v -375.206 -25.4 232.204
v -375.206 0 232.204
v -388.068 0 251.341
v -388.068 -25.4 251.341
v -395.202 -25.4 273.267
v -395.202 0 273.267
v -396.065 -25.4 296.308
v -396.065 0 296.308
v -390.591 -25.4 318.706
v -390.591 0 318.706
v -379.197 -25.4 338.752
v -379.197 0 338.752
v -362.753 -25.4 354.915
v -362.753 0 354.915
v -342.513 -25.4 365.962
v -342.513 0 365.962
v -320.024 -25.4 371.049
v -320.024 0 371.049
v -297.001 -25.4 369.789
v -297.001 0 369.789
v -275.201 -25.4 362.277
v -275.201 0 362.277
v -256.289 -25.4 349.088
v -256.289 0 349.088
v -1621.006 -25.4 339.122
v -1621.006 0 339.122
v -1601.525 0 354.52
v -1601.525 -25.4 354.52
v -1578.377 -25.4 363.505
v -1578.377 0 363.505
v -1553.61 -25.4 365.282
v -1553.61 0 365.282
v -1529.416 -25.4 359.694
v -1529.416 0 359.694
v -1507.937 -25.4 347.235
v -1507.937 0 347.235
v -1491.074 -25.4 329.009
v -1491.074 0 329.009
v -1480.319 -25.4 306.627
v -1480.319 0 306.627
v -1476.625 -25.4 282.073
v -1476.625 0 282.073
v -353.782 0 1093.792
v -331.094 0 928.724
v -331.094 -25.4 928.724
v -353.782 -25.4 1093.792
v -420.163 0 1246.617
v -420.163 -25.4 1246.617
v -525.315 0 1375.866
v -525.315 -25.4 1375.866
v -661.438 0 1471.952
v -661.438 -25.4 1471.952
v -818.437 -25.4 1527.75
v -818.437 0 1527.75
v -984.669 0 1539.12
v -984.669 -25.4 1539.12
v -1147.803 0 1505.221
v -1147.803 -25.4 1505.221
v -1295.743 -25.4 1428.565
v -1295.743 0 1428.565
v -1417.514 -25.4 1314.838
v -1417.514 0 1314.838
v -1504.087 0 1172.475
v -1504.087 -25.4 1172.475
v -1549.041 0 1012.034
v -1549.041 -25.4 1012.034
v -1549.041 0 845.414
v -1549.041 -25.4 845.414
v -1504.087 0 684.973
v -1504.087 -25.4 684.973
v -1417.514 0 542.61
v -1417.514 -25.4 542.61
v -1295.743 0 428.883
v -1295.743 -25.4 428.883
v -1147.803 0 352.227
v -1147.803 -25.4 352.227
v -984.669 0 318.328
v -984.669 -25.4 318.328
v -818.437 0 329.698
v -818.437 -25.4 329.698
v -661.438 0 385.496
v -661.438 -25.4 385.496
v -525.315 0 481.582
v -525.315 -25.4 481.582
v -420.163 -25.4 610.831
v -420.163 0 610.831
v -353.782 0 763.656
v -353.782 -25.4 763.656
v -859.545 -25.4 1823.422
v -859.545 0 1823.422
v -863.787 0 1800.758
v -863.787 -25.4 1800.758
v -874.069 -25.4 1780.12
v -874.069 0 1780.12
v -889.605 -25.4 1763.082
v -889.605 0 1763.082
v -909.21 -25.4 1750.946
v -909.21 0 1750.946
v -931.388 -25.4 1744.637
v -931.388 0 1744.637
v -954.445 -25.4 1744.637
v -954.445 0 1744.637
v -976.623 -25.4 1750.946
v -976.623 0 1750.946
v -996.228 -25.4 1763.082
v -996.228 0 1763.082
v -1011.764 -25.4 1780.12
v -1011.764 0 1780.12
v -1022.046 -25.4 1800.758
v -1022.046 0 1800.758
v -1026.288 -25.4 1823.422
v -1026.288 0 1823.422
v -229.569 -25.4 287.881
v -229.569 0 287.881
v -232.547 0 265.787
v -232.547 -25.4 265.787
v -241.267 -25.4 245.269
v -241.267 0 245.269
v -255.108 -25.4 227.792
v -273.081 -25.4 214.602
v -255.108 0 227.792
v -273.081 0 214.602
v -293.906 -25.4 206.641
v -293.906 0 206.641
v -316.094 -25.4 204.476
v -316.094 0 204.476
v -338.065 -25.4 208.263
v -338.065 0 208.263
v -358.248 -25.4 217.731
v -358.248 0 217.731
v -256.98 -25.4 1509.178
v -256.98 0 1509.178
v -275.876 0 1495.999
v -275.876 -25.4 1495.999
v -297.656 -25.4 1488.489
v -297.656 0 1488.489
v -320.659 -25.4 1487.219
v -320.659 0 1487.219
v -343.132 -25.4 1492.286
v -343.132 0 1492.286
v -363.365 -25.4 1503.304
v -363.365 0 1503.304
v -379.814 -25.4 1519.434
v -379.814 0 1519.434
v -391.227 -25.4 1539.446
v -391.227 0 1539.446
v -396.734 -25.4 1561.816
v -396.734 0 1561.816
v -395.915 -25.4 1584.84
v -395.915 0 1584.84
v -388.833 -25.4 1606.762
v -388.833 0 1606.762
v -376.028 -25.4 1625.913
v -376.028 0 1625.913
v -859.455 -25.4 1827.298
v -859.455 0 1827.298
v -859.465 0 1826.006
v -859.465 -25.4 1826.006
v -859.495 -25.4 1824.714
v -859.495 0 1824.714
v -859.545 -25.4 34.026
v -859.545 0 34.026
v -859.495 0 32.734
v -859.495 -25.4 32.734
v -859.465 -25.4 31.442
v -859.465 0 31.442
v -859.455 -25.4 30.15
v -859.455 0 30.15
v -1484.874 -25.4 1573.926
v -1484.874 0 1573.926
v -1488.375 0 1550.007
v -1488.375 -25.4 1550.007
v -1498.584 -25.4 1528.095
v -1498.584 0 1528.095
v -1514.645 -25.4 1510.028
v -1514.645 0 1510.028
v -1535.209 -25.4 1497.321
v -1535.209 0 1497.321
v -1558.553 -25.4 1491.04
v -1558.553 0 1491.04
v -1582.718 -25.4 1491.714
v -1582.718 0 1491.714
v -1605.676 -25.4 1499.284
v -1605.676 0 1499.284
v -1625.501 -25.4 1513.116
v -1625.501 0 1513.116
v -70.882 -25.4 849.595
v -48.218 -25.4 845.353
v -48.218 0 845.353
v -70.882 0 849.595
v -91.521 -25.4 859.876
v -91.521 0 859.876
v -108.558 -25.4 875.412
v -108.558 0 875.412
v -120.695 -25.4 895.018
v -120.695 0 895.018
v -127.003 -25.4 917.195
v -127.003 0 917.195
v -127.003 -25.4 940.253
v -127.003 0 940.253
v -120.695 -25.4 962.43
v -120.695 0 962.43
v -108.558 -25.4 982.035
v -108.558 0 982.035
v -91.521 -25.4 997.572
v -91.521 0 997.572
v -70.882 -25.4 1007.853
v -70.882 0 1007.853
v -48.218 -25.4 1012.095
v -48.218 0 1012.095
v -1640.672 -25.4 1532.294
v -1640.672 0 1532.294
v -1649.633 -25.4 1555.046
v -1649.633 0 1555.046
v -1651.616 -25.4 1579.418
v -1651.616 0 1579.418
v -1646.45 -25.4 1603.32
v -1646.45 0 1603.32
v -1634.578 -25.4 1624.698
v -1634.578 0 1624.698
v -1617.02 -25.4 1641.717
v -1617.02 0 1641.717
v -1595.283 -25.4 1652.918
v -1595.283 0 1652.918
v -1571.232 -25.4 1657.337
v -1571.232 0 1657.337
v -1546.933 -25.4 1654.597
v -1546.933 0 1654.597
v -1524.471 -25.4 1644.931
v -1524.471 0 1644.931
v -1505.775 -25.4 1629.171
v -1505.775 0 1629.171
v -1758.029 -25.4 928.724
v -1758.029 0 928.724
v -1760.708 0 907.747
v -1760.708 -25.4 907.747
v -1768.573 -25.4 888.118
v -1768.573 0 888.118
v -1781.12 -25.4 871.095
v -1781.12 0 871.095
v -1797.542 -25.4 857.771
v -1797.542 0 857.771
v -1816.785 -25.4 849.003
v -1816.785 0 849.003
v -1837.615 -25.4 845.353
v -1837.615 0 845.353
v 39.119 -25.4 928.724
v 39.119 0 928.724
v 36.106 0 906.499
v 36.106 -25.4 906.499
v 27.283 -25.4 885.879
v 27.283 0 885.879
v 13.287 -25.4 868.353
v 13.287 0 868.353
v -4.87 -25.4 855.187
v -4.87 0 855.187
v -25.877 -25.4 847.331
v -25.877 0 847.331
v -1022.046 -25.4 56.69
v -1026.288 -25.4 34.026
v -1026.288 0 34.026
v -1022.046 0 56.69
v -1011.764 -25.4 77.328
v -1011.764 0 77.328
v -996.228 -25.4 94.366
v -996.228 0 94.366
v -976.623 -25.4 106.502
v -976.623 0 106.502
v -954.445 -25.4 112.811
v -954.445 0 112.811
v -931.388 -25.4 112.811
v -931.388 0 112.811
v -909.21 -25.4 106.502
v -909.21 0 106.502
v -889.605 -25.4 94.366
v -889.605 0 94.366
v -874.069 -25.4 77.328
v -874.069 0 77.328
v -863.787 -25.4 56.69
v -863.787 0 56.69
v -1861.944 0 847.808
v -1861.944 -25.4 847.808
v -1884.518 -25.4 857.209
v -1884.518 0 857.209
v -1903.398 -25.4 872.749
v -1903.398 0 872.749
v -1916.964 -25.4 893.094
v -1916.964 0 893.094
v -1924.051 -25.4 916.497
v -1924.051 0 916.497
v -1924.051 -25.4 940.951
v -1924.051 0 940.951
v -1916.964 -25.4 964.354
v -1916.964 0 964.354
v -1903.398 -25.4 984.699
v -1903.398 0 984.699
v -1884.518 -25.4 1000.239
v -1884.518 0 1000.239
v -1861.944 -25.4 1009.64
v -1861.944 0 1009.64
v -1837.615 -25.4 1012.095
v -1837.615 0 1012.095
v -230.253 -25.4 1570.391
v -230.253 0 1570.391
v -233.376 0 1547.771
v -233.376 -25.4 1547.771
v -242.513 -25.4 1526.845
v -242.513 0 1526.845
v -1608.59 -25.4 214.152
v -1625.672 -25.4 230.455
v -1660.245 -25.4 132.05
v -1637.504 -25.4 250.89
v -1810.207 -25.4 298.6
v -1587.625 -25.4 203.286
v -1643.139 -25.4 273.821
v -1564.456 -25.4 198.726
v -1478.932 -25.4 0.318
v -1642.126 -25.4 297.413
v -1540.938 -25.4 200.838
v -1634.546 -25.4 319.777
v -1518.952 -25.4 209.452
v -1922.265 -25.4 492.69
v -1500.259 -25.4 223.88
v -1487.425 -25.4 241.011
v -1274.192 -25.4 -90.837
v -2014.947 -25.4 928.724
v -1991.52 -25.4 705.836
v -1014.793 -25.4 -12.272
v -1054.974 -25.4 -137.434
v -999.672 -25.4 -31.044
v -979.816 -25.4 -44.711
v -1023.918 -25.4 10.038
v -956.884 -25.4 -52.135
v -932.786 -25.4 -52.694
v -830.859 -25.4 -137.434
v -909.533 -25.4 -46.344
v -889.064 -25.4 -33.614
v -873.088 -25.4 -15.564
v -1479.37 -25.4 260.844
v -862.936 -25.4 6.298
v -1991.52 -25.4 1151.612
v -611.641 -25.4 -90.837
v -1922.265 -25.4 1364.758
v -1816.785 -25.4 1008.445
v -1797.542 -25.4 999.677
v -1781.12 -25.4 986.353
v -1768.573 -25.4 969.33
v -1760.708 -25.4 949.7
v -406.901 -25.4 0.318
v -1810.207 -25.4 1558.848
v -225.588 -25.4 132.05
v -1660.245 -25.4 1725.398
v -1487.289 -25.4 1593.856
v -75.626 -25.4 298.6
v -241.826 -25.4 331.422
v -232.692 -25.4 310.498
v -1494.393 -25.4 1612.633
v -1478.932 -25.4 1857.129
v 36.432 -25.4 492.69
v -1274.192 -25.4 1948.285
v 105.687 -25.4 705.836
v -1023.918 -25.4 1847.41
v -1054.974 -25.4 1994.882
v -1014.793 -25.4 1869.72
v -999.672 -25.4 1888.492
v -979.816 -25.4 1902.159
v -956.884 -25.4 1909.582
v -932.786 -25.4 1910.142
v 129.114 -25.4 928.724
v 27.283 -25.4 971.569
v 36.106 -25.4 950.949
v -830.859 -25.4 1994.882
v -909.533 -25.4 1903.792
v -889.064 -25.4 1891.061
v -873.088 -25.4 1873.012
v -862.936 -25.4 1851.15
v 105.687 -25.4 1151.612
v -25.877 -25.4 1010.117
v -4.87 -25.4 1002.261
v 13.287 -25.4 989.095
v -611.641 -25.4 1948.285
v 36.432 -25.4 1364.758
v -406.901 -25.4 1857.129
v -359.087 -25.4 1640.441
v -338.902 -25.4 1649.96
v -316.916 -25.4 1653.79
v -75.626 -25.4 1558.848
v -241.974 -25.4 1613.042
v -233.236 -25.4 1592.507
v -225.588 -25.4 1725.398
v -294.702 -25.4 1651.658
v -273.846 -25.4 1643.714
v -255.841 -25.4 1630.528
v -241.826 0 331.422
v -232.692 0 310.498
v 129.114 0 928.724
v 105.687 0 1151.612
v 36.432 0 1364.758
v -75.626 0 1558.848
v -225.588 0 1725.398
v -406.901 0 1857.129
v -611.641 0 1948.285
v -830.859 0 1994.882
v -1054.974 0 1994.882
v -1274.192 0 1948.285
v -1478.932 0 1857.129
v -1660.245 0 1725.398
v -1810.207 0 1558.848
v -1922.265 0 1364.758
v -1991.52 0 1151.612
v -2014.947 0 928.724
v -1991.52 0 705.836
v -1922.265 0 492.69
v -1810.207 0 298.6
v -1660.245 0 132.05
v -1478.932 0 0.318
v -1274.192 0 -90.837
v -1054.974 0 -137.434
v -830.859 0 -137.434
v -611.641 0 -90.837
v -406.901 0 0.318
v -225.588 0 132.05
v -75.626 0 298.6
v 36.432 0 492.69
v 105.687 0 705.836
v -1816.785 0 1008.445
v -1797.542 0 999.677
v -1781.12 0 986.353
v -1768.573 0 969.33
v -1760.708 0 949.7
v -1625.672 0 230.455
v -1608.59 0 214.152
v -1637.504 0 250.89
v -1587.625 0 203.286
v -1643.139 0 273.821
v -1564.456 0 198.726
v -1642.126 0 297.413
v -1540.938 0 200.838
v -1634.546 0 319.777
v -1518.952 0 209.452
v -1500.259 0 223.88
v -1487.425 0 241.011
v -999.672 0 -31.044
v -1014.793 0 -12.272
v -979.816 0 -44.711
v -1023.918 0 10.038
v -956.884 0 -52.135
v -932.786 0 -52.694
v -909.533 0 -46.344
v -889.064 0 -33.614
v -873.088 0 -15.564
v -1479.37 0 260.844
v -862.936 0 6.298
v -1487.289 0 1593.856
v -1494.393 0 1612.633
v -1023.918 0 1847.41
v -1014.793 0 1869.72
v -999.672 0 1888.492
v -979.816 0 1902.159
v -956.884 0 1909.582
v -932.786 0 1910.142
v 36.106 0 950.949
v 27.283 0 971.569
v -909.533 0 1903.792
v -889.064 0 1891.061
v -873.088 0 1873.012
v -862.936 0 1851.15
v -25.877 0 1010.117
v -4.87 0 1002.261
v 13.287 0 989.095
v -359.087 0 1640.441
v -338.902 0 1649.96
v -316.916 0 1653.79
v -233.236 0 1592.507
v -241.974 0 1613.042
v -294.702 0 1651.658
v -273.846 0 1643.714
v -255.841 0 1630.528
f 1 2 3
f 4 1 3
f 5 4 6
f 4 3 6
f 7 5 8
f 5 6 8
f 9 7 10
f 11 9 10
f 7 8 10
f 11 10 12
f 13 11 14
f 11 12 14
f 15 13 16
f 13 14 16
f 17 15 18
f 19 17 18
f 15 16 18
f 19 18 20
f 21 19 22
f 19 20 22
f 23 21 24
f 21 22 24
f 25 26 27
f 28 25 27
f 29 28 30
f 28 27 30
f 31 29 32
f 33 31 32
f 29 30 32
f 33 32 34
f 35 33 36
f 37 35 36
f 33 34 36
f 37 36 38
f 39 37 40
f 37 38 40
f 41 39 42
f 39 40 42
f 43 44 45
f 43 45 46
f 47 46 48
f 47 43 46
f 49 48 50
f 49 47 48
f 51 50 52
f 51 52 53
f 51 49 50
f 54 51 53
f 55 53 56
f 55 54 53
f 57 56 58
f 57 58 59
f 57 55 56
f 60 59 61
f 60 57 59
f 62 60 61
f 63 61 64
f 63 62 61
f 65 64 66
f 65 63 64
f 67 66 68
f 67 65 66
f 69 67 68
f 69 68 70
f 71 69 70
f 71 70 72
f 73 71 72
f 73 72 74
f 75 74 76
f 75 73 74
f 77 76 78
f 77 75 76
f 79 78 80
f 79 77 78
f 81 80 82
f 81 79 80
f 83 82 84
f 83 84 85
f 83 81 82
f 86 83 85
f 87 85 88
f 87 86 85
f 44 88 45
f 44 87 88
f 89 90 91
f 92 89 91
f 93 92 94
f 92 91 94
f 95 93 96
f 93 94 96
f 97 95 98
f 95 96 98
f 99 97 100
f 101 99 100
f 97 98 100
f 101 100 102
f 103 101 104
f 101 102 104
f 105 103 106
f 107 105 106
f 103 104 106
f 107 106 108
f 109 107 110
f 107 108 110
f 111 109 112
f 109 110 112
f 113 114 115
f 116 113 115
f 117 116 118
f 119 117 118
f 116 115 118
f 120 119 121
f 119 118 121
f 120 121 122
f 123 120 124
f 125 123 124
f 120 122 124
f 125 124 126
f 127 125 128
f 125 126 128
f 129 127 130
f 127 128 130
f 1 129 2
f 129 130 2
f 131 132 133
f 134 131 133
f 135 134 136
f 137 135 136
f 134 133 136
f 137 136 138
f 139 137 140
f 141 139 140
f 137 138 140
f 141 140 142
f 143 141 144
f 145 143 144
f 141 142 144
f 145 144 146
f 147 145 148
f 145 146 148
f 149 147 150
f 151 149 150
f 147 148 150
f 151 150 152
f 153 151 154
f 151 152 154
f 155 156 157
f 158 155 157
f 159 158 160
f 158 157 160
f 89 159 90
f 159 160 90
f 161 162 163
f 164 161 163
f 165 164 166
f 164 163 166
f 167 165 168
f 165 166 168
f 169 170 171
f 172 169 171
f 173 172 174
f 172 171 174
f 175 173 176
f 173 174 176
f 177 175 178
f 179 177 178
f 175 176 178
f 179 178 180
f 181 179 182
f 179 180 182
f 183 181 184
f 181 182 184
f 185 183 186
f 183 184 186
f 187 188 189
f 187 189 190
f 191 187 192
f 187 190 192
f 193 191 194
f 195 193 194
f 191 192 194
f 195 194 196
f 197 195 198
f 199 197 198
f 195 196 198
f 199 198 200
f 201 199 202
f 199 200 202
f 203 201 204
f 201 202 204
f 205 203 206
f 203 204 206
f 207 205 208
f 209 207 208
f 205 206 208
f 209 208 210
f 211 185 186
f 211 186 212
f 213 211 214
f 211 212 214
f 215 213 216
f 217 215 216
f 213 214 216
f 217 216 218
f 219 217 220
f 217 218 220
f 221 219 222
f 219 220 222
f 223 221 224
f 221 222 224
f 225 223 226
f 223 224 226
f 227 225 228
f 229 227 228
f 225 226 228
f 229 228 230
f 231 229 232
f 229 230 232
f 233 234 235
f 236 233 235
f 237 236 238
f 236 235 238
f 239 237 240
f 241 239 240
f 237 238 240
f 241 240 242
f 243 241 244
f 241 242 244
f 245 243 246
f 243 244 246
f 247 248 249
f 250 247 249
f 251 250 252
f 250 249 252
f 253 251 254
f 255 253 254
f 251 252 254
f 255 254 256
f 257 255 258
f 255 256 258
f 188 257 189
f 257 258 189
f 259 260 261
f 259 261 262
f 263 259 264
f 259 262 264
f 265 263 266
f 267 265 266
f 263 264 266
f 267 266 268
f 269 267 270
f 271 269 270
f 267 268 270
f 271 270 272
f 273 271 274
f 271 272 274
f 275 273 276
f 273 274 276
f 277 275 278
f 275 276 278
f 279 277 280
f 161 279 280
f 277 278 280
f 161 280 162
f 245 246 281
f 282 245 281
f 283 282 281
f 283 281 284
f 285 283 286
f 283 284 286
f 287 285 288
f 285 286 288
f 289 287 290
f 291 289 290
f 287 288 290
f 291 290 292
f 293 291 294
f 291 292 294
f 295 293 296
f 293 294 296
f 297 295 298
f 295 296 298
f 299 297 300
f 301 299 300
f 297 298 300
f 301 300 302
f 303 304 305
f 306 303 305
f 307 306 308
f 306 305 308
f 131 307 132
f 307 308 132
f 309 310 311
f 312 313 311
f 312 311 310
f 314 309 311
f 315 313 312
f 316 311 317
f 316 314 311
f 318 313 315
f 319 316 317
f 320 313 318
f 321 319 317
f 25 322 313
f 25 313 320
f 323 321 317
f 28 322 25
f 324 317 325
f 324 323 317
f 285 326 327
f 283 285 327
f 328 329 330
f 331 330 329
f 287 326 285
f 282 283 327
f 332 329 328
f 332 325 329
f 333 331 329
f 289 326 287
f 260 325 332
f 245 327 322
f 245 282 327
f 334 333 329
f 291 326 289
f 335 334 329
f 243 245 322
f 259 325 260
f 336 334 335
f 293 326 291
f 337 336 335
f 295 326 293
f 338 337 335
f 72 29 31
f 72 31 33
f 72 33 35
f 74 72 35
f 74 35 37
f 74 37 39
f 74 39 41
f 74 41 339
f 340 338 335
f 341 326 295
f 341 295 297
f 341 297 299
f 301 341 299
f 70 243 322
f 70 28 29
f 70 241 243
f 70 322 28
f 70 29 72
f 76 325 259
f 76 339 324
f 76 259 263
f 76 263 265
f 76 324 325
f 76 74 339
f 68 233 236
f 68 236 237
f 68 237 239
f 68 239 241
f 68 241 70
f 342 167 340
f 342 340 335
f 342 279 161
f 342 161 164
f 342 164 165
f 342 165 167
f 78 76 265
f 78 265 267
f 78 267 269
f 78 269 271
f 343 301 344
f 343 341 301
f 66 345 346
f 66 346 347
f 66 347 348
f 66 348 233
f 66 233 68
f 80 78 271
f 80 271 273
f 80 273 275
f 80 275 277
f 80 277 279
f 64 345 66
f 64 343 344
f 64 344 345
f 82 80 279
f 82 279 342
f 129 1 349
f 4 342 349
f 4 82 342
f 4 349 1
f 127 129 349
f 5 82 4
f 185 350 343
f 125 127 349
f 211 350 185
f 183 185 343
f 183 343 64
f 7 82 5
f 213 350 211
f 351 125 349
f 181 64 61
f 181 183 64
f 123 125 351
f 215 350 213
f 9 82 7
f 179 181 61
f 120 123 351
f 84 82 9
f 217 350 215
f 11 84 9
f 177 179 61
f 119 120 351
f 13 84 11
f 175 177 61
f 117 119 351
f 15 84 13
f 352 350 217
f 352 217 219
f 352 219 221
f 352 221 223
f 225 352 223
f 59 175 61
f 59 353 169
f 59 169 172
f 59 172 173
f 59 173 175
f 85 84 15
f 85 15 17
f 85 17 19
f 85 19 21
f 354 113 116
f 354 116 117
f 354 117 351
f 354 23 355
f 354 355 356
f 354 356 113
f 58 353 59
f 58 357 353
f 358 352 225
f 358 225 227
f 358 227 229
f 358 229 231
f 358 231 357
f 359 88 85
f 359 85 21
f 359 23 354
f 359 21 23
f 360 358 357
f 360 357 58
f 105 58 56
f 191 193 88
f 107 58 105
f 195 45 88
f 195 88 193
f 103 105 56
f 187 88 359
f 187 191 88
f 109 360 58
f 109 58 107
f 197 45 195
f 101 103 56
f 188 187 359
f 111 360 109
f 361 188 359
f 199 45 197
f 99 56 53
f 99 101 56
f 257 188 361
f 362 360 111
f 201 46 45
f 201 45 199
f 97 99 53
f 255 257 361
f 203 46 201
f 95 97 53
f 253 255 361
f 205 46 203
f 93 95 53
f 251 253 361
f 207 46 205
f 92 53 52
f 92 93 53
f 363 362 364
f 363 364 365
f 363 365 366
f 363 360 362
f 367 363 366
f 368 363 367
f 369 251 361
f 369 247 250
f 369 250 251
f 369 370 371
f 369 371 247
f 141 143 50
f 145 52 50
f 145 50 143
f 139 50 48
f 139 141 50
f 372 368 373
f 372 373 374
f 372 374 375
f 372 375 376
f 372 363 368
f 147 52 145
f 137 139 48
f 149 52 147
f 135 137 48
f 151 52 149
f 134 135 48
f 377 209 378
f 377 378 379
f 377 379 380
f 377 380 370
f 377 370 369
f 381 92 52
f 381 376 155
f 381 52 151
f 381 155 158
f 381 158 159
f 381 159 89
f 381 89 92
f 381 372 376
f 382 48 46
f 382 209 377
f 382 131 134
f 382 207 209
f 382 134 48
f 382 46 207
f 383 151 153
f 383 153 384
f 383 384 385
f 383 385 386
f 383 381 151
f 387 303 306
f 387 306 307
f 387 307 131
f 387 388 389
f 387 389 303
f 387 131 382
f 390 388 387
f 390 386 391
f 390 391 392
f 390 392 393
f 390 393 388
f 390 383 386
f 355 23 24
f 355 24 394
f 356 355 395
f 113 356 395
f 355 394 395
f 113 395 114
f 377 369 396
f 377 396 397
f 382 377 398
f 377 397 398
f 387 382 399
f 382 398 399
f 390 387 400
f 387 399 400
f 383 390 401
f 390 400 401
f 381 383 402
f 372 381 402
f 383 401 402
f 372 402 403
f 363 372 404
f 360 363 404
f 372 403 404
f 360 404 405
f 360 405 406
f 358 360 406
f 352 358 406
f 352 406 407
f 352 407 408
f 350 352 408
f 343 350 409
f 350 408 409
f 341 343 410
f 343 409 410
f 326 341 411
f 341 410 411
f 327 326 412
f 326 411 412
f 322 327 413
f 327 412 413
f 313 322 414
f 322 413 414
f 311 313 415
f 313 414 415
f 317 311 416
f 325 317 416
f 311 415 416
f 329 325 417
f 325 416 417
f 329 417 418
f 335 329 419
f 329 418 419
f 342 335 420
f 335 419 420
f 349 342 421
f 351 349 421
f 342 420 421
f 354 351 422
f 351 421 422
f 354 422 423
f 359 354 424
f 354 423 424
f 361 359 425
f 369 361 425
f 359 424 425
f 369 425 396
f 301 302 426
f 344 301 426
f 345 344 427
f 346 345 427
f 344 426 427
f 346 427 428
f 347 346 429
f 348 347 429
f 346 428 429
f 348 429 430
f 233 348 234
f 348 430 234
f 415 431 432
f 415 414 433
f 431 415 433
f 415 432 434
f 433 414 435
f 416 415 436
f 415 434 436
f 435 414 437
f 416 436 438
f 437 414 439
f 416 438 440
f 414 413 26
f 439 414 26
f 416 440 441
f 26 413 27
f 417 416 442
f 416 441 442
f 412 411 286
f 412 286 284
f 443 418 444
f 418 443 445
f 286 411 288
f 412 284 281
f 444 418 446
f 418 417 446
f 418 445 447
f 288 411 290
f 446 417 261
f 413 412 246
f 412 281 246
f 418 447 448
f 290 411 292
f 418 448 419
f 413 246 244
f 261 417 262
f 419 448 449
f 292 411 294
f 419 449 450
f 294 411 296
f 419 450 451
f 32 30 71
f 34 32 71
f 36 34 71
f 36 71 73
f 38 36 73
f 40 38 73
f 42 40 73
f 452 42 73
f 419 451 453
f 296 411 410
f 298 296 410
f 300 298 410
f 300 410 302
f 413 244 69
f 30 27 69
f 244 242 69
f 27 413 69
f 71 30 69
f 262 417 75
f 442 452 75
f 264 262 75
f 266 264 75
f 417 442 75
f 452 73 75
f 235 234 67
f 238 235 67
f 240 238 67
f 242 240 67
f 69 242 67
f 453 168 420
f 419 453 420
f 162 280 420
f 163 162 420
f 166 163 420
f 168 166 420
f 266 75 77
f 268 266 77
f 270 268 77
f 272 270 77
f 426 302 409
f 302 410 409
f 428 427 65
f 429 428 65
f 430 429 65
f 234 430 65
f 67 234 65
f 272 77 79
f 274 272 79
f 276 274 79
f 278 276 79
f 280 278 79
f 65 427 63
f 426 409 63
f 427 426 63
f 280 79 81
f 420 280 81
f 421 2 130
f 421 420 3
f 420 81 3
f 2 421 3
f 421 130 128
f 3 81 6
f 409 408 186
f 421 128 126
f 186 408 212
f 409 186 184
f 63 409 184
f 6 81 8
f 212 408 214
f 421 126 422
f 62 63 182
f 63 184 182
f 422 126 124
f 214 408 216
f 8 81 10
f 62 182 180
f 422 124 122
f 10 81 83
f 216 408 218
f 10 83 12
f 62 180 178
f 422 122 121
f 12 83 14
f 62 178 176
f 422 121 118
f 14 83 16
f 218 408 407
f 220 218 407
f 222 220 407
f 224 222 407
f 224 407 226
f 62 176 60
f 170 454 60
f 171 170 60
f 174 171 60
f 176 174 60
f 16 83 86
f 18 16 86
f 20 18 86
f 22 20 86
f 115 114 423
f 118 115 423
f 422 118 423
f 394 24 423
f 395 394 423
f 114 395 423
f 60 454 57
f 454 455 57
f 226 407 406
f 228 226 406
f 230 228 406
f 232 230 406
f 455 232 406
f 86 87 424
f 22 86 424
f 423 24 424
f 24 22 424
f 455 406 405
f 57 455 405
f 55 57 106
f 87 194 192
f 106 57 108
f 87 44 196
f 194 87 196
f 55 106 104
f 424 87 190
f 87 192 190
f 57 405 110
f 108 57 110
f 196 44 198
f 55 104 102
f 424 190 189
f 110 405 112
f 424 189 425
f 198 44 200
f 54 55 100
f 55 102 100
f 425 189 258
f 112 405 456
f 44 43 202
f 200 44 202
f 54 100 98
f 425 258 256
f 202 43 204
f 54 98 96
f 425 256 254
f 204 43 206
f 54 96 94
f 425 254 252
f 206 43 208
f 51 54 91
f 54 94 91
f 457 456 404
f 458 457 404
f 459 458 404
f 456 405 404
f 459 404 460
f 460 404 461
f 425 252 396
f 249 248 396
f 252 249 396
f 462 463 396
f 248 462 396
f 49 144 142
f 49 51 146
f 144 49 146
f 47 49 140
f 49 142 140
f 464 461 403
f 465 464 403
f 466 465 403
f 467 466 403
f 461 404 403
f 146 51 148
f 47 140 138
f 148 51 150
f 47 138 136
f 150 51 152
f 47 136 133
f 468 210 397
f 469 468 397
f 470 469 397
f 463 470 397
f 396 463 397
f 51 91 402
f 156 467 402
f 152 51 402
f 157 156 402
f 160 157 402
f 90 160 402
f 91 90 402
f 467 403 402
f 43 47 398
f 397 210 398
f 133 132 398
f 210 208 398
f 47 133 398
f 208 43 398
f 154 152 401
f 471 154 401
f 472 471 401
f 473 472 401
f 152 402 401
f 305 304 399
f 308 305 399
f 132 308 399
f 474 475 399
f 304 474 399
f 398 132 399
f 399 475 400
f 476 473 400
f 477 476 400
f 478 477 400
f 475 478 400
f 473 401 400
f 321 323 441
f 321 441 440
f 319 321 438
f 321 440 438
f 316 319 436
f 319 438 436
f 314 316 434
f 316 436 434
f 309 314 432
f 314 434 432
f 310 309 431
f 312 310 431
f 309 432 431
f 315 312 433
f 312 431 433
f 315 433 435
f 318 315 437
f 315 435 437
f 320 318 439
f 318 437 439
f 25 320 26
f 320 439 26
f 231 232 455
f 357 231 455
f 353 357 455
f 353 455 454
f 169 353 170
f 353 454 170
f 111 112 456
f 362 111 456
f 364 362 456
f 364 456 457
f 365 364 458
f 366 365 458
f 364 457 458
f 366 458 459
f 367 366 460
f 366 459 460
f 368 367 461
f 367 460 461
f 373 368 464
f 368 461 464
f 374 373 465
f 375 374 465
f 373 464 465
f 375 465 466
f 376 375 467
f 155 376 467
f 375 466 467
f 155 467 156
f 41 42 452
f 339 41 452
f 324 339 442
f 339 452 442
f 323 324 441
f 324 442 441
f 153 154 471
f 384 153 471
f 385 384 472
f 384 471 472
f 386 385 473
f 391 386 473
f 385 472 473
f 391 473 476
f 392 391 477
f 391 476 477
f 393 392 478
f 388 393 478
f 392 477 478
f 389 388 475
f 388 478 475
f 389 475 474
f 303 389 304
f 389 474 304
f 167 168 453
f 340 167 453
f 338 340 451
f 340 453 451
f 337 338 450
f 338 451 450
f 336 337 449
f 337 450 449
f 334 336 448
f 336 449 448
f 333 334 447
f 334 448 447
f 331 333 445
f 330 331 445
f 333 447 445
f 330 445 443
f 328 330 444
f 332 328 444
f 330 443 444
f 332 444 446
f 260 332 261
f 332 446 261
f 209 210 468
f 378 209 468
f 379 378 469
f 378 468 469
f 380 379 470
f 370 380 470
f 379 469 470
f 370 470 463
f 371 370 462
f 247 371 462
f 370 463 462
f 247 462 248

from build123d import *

# Parameters (mm, degrees)
F0_R     = 1072.030298
F0_R_2   = 611.822699
F1_DEPTH = 25.4


with BuildPart() as f1:
    # F0 (on Front) → F1 (new body)
    with BuildSketch(Plane.XZ):
        with Locations((-942.916393, 928.723931)):
            Circle(F0_R)
        with BuildLine():
            ThreePointArc((-256.979817, 1509.177653), (-114.439323, 1276.662508), (-48.218266, 1012.095208))
            ThreePointArc((-48.218266, 1012.095208), (13.287158, 989.094833), (39.119088, 928.723931))
            ThreePointArc((39.119088, 928.723931), (13.287158, 868.35303), (-48.218266, 845.352655))
            ThreePointArc((-48.218266, 845.352655), (-114.232258, 581.278808), (-256.288936, 349.087628))
            ThreePointArc((-256.288936, 349.087628), (-236.540161, 321.2736), (-229.569062, 287.881414))
            ThreePointArc((-229.569062, 287.881414), (-283.226515, 209.922949), (-375.205908, 232.203785))
            ThreePointArc((-375.205908, 232.203785), (-602.629025, 97.074957), (-859.545117, 34.025804))
            ThreePointArc((-859.545117, 34.025804), (-859.477581, 32.088314), (-859.455065, 30.149778))
            ThreePointArc((-859.455065, 30.149778), (-944.854929, -53.289034), (-1026.28767, 34.025804))
            ThreePointArc((-1026.28767, 34.025804), (-1277.041513, 94.580111), (-1500.258634, 223.879881))
            ThreePointArc((-1500.258634, 223.879881), (-1617.710343, 221.696416), (-1621.005834, 339.122185))
            ThreePointArc((-1621.005834, 339.122185), (-1769.041388, 575.237011), (-1837.614521, 845.352655))
            ThreePointArc((-1837.614521, 845.352655), (-1924.951875, 928.723931), (-1837.614521, 1012.095208))
            ThreePointArc((-1837.614521, 1012.095208), (-1770.388782, 1279.045148), (-1625.500919, 1513.115816))
            ThreePointArc((-1625.500919, 1513.115816), (-1626.425841, 1633.854077), (-1505.774898, 1629.170798))
            ThreePointArc((-1505.774898, 1629.170798), (-1280.313223, 1761.549777), (-1026.28767, 1823.422059))
            ThreePointArc((-1026.28767, 1823.422059), (-944.854929, 1910.736897), (-859.455065, 1827.298085))
            ThreePointArc((-859.455065, 1827.298085), (-859.477581, 1825.359549), (-859.545117, 1823.422059))
            ThreePointArc((-859.545117, 1823.422059), (-603.119602, 1760.573467), (-376.027937, 1625.91328))
            ThreePointArc((-376.027937, 1625.91328), (-284.007196, 1648.386079), (-230.252699, 1570.390582))
            ThreePointArc((-230.252699, 1570.390582), (-237.225774, 1536.99387), (-256.979817, 1509.177653))
        make_face(mode=Mode.SUBTRACT)
        with BuildLine():
            ThreePointArc((-48.218266, 845.352655), (-127.803568, 928.723931), (-48.218266, 1012.095208))
            ThreePointArc((-48.218266, 1012.095208), (-114.439323, 1276.662508), (-256.979817, 1509.177653))
            ThreePointArc((-256.979817, 1509.177653), (-372.148477, 1510.798566), (-376.027937, 1625.91328))
            ThreePointArc((-376.027937, 1625.91328), (-603.119602, 1760.573467), (-859.545117, 1823.422059))
            ThreePointArc((-859.545117, 1823.422059), (-942.916393, 1743.836757), (-1026.28767, 1823.422059))
            ThreePointArc((-1026.28767, 1823.422059), (-1280.313223, 1761.549777), (-1505.774898, 1629.170798))
            ThreePointArc((-1505.774898, 1629.170798), (-1490.274163, 1603.459337), (-1484.874345, 1573.926406))
            ThreePointArc((-1484.874345, 1573.926406), (-1535.209355, 1497.32066), (-1625.500919, 1513.115816))
            ThreePointArc((-1625.500919, 1513.115816), (-1770.388782, 1279.045148), (-1837.614521, 1012.095208))
            ThreePointArc((-1837.614521, 1012.095208), (-1781.119645, 986.353329), (-1758.029219, 928.723931))
            ThreePointArc((-1758.029219, 928.723931), (-1781.119645, 871.094533), (-1837.614521, 845.352655))
            ThreePointArc((-1837.614521, 845.352655), (-1769.041388, 575.237011), (-1621.005834, 339.122185))
            ThreePointArc((-1621.005834, 339.122185), (-1529.415826, 359.694218), (-1476.62528, 282.072723))
            ThreePointArc((-1476.62528, 282.072723), (-1482.759008, 250.668335), (-1500.258634, 223.879881))
            ThreePointArc((-1500.258634, 223.879881), (-1277.041513, 94.580111), (-1026.28767, 34.025804))
            ThreePointArc((-1026.28767, 34.025804), (-942.916393, 113.611106), (-859.545117, 34.025804))
            ThreePointArc((-859.545117, 34.025804), (-602.629025, 97.074957), (-375.205908, 232.203785))
            ThreePointArc((-375.205908, 232.203785), (-371.535437, 347.404122), (-256.288936, 349.087628))
            ThreePointArc((-256.288936, 349.087628), (-114.232258, 581.278808), (-48.218266, 845.352655))
        make_face()
        with Locations((-942.916393, 928.723931)):
            Circle(F0_R_2, mode=Mode.SUBTRACT)
    extrude(amount=F1_DEPTH)


solid = f1.part
